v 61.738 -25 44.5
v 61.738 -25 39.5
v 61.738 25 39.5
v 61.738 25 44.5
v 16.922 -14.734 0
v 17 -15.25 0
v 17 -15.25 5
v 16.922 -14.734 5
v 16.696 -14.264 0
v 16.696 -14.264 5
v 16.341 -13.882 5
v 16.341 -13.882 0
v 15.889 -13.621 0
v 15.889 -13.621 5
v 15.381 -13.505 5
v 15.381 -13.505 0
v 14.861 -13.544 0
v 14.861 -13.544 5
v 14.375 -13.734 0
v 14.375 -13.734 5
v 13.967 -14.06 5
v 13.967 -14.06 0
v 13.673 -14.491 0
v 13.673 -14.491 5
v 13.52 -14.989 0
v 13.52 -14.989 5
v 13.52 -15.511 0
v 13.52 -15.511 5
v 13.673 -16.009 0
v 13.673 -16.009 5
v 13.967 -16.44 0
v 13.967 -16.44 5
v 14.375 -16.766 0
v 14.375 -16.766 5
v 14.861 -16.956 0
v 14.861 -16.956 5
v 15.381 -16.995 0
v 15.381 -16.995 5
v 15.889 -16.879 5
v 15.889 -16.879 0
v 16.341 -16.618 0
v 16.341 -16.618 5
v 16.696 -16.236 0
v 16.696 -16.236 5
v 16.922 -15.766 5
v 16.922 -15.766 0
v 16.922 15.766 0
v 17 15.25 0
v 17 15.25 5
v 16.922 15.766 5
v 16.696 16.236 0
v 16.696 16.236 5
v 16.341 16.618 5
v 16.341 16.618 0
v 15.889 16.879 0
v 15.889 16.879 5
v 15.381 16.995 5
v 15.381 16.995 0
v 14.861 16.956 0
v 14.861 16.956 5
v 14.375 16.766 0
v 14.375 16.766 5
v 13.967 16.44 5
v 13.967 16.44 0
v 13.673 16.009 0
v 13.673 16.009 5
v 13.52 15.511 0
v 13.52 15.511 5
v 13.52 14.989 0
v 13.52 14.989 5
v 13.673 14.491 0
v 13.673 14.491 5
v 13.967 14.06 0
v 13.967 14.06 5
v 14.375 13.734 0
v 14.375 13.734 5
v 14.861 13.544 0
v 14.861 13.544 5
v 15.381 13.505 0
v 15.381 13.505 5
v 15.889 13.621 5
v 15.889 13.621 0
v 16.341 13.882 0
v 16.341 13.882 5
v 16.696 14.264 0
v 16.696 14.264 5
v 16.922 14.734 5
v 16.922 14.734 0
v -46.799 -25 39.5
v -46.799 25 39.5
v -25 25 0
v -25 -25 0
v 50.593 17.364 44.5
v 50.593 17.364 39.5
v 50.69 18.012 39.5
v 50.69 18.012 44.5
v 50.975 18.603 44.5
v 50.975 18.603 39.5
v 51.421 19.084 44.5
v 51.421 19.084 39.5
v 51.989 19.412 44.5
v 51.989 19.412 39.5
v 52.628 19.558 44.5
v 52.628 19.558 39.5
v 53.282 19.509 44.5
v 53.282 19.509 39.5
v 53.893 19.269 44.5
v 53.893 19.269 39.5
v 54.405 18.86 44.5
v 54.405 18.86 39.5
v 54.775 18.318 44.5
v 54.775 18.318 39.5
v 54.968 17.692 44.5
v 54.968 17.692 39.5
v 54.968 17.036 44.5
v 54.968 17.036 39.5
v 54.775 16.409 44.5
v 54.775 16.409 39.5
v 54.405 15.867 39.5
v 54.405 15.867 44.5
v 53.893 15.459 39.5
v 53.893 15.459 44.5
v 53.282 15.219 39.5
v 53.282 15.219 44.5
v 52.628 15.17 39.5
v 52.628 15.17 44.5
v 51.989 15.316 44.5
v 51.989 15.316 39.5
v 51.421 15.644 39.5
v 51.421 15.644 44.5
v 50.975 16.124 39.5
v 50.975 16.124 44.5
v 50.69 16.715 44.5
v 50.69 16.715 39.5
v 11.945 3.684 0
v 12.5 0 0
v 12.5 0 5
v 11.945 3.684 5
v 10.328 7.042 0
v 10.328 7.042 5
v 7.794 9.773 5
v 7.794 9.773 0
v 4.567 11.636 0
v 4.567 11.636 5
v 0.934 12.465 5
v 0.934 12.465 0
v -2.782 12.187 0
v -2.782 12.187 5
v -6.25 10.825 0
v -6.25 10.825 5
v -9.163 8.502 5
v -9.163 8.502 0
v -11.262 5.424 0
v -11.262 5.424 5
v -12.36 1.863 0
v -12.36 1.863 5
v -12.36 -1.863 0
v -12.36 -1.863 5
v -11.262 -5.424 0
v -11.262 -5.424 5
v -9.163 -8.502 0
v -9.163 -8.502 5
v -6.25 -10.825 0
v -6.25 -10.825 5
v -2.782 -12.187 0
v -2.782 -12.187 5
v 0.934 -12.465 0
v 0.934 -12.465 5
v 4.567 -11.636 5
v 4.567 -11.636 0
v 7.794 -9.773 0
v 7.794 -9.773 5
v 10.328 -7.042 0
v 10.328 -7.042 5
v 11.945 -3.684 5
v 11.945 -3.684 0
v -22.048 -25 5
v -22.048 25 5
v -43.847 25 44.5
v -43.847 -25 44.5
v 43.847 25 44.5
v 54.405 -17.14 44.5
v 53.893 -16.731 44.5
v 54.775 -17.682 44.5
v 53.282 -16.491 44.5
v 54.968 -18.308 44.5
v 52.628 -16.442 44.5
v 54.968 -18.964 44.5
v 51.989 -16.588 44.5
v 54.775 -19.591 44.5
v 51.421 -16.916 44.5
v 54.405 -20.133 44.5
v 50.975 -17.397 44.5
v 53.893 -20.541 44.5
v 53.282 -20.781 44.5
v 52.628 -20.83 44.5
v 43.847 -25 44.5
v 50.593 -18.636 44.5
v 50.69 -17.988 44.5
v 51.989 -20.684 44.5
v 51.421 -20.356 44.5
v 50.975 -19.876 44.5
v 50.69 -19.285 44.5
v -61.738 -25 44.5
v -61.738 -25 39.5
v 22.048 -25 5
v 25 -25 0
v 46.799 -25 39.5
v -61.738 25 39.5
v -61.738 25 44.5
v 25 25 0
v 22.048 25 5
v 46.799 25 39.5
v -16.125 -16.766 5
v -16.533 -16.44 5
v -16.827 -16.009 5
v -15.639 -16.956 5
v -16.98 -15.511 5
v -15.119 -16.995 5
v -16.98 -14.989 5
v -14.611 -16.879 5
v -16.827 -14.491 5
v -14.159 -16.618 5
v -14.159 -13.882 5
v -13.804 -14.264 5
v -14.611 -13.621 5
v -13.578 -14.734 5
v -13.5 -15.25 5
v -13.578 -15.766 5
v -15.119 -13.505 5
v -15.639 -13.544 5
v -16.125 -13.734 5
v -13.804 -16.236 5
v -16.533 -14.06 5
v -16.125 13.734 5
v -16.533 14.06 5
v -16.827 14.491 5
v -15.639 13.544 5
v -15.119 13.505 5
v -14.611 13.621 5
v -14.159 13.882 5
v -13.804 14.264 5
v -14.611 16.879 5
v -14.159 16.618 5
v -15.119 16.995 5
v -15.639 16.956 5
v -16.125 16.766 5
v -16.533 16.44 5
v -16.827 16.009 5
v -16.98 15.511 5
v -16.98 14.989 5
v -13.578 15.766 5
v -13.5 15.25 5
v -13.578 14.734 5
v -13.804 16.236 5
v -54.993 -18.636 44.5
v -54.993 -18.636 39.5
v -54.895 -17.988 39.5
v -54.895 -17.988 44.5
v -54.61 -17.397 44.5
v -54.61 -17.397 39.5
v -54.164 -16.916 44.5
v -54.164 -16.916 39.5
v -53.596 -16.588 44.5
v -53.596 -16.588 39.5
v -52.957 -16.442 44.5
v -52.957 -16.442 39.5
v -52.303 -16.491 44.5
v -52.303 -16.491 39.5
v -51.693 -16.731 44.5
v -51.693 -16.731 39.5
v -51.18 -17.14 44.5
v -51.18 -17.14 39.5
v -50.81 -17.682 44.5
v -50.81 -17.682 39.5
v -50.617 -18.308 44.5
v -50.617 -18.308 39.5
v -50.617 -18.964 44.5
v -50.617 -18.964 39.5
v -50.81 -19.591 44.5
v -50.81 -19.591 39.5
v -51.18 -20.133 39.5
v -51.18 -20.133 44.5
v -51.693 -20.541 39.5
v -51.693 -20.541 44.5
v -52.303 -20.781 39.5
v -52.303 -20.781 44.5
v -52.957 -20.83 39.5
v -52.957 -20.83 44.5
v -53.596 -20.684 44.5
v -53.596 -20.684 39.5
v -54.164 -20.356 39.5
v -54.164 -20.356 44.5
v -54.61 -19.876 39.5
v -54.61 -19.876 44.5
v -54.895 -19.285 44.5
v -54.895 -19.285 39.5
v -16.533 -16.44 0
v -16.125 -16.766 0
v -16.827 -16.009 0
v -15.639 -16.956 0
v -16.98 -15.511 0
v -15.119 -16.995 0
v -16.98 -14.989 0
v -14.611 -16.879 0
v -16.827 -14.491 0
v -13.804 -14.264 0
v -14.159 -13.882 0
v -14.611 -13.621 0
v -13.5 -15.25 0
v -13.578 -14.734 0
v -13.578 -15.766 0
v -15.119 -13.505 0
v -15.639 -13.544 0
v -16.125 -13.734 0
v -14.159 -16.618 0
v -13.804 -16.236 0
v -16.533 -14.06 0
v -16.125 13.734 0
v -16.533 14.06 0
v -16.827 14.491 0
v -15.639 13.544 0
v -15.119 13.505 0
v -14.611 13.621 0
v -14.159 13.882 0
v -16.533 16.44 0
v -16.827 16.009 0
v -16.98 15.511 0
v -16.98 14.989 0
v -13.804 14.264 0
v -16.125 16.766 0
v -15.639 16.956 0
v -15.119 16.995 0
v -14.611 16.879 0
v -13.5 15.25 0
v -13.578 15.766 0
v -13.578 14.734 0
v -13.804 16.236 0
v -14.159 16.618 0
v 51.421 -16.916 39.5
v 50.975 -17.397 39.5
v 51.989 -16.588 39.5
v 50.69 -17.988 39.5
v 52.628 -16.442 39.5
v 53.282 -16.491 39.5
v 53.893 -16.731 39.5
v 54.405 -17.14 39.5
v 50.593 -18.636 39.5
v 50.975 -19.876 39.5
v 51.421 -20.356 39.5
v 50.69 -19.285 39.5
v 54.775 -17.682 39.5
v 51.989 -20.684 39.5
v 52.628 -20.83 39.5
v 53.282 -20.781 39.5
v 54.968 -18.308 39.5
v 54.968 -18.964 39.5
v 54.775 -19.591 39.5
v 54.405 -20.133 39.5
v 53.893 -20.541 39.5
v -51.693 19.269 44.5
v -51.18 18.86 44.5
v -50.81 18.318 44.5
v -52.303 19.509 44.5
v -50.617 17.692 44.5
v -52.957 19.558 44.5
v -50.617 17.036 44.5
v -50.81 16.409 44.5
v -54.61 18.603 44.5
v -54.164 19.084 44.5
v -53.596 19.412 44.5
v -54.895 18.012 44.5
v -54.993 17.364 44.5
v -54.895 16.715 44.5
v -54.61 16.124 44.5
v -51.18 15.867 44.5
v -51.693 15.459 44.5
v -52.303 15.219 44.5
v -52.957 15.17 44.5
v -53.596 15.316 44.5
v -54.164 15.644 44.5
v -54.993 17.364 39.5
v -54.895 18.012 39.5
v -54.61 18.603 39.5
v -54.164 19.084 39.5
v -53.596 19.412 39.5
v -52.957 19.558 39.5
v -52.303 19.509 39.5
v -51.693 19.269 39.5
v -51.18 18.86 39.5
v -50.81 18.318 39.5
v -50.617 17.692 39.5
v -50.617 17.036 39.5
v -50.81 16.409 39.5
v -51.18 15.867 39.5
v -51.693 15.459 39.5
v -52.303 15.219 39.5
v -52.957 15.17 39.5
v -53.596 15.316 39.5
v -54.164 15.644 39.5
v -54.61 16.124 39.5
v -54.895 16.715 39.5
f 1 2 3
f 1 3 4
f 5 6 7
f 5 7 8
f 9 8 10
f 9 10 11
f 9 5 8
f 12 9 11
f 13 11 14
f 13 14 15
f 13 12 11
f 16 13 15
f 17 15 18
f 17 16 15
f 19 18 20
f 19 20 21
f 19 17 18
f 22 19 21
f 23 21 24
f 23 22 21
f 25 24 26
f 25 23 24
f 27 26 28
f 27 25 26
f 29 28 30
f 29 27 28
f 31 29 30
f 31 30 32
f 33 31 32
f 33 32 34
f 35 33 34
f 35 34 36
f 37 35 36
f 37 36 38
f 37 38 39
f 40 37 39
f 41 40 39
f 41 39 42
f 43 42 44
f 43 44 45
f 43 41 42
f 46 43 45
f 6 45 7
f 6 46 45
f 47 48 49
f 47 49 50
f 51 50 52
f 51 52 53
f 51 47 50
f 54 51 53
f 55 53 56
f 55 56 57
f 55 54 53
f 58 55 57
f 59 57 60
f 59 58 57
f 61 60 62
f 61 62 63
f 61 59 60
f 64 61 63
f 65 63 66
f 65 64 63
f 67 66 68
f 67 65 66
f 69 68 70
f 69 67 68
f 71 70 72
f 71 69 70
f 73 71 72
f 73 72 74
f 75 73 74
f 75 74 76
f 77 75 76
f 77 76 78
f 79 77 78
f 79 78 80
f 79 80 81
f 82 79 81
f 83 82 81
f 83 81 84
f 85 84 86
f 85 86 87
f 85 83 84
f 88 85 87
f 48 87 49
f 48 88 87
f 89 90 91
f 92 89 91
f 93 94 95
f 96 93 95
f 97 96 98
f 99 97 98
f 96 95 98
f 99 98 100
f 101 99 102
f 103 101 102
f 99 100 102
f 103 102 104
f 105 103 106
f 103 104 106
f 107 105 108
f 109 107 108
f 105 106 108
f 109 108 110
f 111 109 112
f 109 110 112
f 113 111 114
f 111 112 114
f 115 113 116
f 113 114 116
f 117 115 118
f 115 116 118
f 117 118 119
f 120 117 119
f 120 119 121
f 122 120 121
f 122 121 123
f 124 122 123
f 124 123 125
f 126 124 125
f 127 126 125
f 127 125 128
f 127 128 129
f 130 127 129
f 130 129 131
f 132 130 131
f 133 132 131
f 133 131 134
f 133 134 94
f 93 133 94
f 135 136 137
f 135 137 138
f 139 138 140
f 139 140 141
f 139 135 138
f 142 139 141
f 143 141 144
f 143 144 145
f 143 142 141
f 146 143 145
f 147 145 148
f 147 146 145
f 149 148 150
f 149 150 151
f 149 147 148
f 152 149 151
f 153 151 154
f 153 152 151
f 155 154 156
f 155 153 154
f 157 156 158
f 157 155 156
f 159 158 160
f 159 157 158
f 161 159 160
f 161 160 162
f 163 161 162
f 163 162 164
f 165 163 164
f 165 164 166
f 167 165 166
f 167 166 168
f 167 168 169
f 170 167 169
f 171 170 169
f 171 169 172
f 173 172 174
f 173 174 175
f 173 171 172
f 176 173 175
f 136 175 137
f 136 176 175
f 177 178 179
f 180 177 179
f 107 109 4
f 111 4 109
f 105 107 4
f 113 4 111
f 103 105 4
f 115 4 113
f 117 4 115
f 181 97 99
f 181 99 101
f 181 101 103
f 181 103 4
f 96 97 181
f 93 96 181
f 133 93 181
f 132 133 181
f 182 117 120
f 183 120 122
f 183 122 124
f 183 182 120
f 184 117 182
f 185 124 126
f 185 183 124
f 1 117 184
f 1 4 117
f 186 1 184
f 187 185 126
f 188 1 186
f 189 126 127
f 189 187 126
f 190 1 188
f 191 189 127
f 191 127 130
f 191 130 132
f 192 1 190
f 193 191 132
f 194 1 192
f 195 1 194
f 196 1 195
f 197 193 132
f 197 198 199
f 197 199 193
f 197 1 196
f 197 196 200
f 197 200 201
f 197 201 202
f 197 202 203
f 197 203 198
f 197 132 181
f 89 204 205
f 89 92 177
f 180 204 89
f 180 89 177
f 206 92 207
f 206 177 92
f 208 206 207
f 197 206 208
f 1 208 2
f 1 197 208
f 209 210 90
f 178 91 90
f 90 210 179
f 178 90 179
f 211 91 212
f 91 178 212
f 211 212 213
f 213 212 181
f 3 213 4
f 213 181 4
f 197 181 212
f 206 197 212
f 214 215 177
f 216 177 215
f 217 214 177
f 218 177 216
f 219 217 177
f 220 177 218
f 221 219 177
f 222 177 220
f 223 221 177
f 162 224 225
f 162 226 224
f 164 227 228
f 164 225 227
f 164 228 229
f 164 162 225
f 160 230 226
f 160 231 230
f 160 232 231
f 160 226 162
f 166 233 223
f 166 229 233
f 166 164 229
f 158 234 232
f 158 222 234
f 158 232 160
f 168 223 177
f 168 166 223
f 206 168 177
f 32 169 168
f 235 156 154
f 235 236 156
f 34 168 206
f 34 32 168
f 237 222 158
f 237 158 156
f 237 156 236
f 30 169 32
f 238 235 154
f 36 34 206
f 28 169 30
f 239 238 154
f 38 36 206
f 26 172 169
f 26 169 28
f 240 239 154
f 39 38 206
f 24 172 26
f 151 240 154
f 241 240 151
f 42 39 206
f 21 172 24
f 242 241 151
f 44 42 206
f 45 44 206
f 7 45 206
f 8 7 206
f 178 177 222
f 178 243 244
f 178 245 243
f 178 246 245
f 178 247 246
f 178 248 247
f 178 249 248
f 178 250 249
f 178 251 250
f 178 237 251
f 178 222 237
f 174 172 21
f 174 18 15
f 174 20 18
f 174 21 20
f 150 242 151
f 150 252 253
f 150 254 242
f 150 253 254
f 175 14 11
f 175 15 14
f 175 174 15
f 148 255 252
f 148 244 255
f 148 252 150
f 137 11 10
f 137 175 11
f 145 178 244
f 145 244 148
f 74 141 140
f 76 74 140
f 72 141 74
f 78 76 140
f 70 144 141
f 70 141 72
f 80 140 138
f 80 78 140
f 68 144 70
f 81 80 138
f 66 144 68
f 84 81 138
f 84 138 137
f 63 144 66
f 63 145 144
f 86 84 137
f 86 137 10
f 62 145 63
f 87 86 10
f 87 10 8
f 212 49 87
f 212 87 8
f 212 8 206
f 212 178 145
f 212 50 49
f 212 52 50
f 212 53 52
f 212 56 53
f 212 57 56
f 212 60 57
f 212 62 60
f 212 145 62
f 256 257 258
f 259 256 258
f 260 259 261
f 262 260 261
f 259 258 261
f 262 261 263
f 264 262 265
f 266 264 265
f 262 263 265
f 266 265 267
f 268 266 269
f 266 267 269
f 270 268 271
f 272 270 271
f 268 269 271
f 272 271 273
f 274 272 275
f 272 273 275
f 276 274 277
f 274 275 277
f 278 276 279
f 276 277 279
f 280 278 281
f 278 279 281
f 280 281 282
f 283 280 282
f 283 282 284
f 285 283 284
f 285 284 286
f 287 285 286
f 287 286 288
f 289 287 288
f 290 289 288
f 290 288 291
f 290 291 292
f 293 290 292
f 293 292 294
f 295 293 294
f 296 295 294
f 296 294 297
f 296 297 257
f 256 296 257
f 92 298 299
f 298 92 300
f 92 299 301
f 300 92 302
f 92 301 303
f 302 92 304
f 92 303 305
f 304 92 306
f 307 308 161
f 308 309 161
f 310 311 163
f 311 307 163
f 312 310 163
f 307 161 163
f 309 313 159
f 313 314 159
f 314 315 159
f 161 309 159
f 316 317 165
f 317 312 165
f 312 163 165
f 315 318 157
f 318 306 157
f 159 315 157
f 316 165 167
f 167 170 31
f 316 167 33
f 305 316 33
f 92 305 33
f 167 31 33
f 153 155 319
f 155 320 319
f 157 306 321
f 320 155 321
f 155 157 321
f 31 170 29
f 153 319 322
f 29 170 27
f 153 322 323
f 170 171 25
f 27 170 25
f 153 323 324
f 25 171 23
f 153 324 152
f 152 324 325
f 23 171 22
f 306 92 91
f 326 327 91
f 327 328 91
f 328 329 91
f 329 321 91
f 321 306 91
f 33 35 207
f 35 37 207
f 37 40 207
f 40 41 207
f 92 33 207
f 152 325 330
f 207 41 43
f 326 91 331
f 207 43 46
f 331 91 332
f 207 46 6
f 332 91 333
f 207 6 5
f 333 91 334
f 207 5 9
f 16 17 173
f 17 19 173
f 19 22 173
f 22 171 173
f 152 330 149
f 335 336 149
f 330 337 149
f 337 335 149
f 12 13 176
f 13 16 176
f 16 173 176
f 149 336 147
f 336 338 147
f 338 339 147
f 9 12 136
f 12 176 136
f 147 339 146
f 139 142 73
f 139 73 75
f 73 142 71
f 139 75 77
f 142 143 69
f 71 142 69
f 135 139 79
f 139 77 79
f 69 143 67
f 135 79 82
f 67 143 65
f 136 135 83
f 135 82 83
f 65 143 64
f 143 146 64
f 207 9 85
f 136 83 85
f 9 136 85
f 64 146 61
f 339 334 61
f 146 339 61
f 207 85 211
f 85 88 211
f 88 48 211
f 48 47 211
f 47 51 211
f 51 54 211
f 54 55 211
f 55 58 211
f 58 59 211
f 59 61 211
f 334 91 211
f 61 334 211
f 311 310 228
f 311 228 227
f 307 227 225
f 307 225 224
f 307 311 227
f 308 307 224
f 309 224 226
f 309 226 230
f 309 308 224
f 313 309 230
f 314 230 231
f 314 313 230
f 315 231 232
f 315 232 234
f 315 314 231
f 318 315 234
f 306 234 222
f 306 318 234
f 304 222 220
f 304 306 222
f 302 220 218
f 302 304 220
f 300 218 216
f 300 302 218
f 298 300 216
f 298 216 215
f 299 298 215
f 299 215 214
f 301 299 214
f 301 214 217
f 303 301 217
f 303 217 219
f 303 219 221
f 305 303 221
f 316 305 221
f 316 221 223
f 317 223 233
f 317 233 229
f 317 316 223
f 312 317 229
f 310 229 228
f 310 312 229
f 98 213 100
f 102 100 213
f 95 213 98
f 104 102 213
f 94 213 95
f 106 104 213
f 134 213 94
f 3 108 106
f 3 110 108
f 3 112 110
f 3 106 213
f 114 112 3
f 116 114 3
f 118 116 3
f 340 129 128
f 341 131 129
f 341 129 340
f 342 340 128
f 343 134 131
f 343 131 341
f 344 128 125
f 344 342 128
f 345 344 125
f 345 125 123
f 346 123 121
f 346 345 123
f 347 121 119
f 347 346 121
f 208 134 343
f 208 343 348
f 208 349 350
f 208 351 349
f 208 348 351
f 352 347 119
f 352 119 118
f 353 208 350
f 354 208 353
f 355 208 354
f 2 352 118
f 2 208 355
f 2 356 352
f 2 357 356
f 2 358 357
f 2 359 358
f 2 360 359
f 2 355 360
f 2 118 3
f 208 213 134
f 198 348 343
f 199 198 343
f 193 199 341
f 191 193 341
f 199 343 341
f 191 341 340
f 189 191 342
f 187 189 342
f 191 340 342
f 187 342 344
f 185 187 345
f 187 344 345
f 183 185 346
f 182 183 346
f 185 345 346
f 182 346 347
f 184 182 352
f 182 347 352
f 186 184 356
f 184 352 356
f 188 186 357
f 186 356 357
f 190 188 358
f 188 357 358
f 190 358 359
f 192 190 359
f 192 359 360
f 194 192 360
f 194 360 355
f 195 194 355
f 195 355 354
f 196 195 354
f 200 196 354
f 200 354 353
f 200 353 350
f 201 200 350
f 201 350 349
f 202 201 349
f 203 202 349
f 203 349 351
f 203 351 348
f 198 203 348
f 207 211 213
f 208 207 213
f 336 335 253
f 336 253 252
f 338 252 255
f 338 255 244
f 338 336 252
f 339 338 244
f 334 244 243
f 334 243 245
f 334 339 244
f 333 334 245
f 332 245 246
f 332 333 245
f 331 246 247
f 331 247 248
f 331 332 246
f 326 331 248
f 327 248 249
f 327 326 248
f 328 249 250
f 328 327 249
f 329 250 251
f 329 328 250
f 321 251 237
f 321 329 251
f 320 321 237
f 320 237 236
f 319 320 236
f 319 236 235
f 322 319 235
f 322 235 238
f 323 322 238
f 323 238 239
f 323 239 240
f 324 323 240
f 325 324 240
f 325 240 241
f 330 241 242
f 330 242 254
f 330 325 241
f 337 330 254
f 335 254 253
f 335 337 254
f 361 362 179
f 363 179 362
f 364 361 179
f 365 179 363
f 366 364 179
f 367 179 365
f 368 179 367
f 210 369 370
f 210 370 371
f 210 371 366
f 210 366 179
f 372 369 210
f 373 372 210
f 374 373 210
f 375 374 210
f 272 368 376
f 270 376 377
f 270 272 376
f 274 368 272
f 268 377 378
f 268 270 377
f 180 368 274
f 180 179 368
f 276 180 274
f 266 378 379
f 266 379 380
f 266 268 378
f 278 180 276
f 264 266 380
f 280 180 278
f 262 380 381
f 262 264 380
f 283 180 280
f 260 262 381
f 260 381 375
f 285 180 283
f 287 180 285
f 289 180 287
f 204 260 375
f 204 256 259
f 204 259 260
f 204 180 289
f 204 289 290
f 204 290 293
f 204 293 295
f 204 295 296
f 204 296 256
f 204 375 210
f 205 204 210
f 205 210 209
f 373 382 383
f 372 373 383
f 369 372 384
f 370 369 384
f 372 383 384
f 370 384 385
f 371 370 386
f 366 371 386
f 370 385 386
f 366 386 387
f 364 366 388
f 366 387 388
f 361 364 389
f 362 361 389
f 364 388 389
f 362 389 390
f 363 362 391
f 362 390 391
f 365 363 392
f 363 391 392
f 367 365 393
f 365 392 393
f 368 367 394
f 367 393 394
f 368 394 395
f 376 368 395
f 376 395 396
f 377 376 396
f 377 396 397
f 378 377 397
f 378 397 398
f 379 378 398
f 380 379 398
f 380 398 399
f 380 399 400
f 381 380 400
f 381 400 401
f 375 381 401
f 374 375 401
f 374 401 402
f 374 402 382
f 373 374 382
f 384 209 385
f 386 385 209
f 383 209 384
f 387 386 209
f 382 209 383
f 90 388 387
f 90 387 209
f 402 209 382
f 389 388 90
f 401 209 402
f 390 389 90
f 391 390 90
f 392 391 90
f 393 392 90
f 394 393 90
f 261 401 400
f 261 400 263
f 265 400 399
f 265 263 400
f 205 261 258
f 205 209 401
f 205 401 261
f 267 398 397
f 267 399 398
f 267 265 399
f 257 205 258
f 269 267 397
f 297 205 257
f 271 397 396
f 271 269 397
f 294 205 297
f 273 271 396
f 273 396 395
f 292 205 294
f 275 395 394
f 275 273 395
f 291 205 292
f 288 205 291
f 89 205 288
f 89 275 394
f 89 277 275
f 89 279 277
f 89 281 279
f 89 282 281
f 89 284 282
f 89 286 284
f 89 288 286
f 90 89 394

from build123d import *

# Parameters (mm, degrees)
F0_W     = 50
F0_H     = 50
F0_R     = 1.75
F0_R_2   = 12.5
F1_DEPTH = 5
F3_DEPTH = 50
F5_D     = 4.4


with BuildPart() as f1:
    # F0 (on Top) → F1 (new body)
    with BuildSketch(Plane.XY):
        Rectangle(F0_W, F0_H)
        with Locations((-15.25, -15.25)):
            Circle(F0_R, mode=Mode.SUBTRACT)
        with Locations((15.25, -15.25)):
            Circle(F0_R, mode=Mode.SUBTRACT)
        with Locations((-15.25, 15.25)):
            Circle(F0_R, mode=Mode.SUBTRACT)
        Circle(F0_R_2, mode=Mode.SUBTRACT)
        with Locations((15.25, 15.25)):
            Circle(F0_R, mode=Mode.SUBTRACT)
    extrude(amount=F1_DEPTH)

    # F2 (on face) → F3 (join, through all)
    with BuildSketch(Plane.XZ.offset(25)):
        Polygon((-46.7986041229, 39.5), (-25, 0), (-25, 5), (-22.0484650111, 5), (-43.847069134, 44.5), (-61.7379361051, 44.5), (-61.7379361051, 39.5), align=None)
        Polygon((25, 5), (25, 0), (46.7986041229, 39.5), (61.7379361051, 39.5), (61.7379361051, 44.5), (43.847069134, 44.5), (22.0484650111, 5), align=None)
    extrude(amount=-F3_DEPTH)

    # F5 (through all)
    with Locations(Plane.XY.offset(44.5)):
        with Locations((-52.7925026196, 17.3637714833), (-52.7925026196, -18.6362285167), (52.7925026196, -18.6362285167), (52.7925026196, 17.3637714833)):
            Hole(F5_D / 2)


solid = f1.part
